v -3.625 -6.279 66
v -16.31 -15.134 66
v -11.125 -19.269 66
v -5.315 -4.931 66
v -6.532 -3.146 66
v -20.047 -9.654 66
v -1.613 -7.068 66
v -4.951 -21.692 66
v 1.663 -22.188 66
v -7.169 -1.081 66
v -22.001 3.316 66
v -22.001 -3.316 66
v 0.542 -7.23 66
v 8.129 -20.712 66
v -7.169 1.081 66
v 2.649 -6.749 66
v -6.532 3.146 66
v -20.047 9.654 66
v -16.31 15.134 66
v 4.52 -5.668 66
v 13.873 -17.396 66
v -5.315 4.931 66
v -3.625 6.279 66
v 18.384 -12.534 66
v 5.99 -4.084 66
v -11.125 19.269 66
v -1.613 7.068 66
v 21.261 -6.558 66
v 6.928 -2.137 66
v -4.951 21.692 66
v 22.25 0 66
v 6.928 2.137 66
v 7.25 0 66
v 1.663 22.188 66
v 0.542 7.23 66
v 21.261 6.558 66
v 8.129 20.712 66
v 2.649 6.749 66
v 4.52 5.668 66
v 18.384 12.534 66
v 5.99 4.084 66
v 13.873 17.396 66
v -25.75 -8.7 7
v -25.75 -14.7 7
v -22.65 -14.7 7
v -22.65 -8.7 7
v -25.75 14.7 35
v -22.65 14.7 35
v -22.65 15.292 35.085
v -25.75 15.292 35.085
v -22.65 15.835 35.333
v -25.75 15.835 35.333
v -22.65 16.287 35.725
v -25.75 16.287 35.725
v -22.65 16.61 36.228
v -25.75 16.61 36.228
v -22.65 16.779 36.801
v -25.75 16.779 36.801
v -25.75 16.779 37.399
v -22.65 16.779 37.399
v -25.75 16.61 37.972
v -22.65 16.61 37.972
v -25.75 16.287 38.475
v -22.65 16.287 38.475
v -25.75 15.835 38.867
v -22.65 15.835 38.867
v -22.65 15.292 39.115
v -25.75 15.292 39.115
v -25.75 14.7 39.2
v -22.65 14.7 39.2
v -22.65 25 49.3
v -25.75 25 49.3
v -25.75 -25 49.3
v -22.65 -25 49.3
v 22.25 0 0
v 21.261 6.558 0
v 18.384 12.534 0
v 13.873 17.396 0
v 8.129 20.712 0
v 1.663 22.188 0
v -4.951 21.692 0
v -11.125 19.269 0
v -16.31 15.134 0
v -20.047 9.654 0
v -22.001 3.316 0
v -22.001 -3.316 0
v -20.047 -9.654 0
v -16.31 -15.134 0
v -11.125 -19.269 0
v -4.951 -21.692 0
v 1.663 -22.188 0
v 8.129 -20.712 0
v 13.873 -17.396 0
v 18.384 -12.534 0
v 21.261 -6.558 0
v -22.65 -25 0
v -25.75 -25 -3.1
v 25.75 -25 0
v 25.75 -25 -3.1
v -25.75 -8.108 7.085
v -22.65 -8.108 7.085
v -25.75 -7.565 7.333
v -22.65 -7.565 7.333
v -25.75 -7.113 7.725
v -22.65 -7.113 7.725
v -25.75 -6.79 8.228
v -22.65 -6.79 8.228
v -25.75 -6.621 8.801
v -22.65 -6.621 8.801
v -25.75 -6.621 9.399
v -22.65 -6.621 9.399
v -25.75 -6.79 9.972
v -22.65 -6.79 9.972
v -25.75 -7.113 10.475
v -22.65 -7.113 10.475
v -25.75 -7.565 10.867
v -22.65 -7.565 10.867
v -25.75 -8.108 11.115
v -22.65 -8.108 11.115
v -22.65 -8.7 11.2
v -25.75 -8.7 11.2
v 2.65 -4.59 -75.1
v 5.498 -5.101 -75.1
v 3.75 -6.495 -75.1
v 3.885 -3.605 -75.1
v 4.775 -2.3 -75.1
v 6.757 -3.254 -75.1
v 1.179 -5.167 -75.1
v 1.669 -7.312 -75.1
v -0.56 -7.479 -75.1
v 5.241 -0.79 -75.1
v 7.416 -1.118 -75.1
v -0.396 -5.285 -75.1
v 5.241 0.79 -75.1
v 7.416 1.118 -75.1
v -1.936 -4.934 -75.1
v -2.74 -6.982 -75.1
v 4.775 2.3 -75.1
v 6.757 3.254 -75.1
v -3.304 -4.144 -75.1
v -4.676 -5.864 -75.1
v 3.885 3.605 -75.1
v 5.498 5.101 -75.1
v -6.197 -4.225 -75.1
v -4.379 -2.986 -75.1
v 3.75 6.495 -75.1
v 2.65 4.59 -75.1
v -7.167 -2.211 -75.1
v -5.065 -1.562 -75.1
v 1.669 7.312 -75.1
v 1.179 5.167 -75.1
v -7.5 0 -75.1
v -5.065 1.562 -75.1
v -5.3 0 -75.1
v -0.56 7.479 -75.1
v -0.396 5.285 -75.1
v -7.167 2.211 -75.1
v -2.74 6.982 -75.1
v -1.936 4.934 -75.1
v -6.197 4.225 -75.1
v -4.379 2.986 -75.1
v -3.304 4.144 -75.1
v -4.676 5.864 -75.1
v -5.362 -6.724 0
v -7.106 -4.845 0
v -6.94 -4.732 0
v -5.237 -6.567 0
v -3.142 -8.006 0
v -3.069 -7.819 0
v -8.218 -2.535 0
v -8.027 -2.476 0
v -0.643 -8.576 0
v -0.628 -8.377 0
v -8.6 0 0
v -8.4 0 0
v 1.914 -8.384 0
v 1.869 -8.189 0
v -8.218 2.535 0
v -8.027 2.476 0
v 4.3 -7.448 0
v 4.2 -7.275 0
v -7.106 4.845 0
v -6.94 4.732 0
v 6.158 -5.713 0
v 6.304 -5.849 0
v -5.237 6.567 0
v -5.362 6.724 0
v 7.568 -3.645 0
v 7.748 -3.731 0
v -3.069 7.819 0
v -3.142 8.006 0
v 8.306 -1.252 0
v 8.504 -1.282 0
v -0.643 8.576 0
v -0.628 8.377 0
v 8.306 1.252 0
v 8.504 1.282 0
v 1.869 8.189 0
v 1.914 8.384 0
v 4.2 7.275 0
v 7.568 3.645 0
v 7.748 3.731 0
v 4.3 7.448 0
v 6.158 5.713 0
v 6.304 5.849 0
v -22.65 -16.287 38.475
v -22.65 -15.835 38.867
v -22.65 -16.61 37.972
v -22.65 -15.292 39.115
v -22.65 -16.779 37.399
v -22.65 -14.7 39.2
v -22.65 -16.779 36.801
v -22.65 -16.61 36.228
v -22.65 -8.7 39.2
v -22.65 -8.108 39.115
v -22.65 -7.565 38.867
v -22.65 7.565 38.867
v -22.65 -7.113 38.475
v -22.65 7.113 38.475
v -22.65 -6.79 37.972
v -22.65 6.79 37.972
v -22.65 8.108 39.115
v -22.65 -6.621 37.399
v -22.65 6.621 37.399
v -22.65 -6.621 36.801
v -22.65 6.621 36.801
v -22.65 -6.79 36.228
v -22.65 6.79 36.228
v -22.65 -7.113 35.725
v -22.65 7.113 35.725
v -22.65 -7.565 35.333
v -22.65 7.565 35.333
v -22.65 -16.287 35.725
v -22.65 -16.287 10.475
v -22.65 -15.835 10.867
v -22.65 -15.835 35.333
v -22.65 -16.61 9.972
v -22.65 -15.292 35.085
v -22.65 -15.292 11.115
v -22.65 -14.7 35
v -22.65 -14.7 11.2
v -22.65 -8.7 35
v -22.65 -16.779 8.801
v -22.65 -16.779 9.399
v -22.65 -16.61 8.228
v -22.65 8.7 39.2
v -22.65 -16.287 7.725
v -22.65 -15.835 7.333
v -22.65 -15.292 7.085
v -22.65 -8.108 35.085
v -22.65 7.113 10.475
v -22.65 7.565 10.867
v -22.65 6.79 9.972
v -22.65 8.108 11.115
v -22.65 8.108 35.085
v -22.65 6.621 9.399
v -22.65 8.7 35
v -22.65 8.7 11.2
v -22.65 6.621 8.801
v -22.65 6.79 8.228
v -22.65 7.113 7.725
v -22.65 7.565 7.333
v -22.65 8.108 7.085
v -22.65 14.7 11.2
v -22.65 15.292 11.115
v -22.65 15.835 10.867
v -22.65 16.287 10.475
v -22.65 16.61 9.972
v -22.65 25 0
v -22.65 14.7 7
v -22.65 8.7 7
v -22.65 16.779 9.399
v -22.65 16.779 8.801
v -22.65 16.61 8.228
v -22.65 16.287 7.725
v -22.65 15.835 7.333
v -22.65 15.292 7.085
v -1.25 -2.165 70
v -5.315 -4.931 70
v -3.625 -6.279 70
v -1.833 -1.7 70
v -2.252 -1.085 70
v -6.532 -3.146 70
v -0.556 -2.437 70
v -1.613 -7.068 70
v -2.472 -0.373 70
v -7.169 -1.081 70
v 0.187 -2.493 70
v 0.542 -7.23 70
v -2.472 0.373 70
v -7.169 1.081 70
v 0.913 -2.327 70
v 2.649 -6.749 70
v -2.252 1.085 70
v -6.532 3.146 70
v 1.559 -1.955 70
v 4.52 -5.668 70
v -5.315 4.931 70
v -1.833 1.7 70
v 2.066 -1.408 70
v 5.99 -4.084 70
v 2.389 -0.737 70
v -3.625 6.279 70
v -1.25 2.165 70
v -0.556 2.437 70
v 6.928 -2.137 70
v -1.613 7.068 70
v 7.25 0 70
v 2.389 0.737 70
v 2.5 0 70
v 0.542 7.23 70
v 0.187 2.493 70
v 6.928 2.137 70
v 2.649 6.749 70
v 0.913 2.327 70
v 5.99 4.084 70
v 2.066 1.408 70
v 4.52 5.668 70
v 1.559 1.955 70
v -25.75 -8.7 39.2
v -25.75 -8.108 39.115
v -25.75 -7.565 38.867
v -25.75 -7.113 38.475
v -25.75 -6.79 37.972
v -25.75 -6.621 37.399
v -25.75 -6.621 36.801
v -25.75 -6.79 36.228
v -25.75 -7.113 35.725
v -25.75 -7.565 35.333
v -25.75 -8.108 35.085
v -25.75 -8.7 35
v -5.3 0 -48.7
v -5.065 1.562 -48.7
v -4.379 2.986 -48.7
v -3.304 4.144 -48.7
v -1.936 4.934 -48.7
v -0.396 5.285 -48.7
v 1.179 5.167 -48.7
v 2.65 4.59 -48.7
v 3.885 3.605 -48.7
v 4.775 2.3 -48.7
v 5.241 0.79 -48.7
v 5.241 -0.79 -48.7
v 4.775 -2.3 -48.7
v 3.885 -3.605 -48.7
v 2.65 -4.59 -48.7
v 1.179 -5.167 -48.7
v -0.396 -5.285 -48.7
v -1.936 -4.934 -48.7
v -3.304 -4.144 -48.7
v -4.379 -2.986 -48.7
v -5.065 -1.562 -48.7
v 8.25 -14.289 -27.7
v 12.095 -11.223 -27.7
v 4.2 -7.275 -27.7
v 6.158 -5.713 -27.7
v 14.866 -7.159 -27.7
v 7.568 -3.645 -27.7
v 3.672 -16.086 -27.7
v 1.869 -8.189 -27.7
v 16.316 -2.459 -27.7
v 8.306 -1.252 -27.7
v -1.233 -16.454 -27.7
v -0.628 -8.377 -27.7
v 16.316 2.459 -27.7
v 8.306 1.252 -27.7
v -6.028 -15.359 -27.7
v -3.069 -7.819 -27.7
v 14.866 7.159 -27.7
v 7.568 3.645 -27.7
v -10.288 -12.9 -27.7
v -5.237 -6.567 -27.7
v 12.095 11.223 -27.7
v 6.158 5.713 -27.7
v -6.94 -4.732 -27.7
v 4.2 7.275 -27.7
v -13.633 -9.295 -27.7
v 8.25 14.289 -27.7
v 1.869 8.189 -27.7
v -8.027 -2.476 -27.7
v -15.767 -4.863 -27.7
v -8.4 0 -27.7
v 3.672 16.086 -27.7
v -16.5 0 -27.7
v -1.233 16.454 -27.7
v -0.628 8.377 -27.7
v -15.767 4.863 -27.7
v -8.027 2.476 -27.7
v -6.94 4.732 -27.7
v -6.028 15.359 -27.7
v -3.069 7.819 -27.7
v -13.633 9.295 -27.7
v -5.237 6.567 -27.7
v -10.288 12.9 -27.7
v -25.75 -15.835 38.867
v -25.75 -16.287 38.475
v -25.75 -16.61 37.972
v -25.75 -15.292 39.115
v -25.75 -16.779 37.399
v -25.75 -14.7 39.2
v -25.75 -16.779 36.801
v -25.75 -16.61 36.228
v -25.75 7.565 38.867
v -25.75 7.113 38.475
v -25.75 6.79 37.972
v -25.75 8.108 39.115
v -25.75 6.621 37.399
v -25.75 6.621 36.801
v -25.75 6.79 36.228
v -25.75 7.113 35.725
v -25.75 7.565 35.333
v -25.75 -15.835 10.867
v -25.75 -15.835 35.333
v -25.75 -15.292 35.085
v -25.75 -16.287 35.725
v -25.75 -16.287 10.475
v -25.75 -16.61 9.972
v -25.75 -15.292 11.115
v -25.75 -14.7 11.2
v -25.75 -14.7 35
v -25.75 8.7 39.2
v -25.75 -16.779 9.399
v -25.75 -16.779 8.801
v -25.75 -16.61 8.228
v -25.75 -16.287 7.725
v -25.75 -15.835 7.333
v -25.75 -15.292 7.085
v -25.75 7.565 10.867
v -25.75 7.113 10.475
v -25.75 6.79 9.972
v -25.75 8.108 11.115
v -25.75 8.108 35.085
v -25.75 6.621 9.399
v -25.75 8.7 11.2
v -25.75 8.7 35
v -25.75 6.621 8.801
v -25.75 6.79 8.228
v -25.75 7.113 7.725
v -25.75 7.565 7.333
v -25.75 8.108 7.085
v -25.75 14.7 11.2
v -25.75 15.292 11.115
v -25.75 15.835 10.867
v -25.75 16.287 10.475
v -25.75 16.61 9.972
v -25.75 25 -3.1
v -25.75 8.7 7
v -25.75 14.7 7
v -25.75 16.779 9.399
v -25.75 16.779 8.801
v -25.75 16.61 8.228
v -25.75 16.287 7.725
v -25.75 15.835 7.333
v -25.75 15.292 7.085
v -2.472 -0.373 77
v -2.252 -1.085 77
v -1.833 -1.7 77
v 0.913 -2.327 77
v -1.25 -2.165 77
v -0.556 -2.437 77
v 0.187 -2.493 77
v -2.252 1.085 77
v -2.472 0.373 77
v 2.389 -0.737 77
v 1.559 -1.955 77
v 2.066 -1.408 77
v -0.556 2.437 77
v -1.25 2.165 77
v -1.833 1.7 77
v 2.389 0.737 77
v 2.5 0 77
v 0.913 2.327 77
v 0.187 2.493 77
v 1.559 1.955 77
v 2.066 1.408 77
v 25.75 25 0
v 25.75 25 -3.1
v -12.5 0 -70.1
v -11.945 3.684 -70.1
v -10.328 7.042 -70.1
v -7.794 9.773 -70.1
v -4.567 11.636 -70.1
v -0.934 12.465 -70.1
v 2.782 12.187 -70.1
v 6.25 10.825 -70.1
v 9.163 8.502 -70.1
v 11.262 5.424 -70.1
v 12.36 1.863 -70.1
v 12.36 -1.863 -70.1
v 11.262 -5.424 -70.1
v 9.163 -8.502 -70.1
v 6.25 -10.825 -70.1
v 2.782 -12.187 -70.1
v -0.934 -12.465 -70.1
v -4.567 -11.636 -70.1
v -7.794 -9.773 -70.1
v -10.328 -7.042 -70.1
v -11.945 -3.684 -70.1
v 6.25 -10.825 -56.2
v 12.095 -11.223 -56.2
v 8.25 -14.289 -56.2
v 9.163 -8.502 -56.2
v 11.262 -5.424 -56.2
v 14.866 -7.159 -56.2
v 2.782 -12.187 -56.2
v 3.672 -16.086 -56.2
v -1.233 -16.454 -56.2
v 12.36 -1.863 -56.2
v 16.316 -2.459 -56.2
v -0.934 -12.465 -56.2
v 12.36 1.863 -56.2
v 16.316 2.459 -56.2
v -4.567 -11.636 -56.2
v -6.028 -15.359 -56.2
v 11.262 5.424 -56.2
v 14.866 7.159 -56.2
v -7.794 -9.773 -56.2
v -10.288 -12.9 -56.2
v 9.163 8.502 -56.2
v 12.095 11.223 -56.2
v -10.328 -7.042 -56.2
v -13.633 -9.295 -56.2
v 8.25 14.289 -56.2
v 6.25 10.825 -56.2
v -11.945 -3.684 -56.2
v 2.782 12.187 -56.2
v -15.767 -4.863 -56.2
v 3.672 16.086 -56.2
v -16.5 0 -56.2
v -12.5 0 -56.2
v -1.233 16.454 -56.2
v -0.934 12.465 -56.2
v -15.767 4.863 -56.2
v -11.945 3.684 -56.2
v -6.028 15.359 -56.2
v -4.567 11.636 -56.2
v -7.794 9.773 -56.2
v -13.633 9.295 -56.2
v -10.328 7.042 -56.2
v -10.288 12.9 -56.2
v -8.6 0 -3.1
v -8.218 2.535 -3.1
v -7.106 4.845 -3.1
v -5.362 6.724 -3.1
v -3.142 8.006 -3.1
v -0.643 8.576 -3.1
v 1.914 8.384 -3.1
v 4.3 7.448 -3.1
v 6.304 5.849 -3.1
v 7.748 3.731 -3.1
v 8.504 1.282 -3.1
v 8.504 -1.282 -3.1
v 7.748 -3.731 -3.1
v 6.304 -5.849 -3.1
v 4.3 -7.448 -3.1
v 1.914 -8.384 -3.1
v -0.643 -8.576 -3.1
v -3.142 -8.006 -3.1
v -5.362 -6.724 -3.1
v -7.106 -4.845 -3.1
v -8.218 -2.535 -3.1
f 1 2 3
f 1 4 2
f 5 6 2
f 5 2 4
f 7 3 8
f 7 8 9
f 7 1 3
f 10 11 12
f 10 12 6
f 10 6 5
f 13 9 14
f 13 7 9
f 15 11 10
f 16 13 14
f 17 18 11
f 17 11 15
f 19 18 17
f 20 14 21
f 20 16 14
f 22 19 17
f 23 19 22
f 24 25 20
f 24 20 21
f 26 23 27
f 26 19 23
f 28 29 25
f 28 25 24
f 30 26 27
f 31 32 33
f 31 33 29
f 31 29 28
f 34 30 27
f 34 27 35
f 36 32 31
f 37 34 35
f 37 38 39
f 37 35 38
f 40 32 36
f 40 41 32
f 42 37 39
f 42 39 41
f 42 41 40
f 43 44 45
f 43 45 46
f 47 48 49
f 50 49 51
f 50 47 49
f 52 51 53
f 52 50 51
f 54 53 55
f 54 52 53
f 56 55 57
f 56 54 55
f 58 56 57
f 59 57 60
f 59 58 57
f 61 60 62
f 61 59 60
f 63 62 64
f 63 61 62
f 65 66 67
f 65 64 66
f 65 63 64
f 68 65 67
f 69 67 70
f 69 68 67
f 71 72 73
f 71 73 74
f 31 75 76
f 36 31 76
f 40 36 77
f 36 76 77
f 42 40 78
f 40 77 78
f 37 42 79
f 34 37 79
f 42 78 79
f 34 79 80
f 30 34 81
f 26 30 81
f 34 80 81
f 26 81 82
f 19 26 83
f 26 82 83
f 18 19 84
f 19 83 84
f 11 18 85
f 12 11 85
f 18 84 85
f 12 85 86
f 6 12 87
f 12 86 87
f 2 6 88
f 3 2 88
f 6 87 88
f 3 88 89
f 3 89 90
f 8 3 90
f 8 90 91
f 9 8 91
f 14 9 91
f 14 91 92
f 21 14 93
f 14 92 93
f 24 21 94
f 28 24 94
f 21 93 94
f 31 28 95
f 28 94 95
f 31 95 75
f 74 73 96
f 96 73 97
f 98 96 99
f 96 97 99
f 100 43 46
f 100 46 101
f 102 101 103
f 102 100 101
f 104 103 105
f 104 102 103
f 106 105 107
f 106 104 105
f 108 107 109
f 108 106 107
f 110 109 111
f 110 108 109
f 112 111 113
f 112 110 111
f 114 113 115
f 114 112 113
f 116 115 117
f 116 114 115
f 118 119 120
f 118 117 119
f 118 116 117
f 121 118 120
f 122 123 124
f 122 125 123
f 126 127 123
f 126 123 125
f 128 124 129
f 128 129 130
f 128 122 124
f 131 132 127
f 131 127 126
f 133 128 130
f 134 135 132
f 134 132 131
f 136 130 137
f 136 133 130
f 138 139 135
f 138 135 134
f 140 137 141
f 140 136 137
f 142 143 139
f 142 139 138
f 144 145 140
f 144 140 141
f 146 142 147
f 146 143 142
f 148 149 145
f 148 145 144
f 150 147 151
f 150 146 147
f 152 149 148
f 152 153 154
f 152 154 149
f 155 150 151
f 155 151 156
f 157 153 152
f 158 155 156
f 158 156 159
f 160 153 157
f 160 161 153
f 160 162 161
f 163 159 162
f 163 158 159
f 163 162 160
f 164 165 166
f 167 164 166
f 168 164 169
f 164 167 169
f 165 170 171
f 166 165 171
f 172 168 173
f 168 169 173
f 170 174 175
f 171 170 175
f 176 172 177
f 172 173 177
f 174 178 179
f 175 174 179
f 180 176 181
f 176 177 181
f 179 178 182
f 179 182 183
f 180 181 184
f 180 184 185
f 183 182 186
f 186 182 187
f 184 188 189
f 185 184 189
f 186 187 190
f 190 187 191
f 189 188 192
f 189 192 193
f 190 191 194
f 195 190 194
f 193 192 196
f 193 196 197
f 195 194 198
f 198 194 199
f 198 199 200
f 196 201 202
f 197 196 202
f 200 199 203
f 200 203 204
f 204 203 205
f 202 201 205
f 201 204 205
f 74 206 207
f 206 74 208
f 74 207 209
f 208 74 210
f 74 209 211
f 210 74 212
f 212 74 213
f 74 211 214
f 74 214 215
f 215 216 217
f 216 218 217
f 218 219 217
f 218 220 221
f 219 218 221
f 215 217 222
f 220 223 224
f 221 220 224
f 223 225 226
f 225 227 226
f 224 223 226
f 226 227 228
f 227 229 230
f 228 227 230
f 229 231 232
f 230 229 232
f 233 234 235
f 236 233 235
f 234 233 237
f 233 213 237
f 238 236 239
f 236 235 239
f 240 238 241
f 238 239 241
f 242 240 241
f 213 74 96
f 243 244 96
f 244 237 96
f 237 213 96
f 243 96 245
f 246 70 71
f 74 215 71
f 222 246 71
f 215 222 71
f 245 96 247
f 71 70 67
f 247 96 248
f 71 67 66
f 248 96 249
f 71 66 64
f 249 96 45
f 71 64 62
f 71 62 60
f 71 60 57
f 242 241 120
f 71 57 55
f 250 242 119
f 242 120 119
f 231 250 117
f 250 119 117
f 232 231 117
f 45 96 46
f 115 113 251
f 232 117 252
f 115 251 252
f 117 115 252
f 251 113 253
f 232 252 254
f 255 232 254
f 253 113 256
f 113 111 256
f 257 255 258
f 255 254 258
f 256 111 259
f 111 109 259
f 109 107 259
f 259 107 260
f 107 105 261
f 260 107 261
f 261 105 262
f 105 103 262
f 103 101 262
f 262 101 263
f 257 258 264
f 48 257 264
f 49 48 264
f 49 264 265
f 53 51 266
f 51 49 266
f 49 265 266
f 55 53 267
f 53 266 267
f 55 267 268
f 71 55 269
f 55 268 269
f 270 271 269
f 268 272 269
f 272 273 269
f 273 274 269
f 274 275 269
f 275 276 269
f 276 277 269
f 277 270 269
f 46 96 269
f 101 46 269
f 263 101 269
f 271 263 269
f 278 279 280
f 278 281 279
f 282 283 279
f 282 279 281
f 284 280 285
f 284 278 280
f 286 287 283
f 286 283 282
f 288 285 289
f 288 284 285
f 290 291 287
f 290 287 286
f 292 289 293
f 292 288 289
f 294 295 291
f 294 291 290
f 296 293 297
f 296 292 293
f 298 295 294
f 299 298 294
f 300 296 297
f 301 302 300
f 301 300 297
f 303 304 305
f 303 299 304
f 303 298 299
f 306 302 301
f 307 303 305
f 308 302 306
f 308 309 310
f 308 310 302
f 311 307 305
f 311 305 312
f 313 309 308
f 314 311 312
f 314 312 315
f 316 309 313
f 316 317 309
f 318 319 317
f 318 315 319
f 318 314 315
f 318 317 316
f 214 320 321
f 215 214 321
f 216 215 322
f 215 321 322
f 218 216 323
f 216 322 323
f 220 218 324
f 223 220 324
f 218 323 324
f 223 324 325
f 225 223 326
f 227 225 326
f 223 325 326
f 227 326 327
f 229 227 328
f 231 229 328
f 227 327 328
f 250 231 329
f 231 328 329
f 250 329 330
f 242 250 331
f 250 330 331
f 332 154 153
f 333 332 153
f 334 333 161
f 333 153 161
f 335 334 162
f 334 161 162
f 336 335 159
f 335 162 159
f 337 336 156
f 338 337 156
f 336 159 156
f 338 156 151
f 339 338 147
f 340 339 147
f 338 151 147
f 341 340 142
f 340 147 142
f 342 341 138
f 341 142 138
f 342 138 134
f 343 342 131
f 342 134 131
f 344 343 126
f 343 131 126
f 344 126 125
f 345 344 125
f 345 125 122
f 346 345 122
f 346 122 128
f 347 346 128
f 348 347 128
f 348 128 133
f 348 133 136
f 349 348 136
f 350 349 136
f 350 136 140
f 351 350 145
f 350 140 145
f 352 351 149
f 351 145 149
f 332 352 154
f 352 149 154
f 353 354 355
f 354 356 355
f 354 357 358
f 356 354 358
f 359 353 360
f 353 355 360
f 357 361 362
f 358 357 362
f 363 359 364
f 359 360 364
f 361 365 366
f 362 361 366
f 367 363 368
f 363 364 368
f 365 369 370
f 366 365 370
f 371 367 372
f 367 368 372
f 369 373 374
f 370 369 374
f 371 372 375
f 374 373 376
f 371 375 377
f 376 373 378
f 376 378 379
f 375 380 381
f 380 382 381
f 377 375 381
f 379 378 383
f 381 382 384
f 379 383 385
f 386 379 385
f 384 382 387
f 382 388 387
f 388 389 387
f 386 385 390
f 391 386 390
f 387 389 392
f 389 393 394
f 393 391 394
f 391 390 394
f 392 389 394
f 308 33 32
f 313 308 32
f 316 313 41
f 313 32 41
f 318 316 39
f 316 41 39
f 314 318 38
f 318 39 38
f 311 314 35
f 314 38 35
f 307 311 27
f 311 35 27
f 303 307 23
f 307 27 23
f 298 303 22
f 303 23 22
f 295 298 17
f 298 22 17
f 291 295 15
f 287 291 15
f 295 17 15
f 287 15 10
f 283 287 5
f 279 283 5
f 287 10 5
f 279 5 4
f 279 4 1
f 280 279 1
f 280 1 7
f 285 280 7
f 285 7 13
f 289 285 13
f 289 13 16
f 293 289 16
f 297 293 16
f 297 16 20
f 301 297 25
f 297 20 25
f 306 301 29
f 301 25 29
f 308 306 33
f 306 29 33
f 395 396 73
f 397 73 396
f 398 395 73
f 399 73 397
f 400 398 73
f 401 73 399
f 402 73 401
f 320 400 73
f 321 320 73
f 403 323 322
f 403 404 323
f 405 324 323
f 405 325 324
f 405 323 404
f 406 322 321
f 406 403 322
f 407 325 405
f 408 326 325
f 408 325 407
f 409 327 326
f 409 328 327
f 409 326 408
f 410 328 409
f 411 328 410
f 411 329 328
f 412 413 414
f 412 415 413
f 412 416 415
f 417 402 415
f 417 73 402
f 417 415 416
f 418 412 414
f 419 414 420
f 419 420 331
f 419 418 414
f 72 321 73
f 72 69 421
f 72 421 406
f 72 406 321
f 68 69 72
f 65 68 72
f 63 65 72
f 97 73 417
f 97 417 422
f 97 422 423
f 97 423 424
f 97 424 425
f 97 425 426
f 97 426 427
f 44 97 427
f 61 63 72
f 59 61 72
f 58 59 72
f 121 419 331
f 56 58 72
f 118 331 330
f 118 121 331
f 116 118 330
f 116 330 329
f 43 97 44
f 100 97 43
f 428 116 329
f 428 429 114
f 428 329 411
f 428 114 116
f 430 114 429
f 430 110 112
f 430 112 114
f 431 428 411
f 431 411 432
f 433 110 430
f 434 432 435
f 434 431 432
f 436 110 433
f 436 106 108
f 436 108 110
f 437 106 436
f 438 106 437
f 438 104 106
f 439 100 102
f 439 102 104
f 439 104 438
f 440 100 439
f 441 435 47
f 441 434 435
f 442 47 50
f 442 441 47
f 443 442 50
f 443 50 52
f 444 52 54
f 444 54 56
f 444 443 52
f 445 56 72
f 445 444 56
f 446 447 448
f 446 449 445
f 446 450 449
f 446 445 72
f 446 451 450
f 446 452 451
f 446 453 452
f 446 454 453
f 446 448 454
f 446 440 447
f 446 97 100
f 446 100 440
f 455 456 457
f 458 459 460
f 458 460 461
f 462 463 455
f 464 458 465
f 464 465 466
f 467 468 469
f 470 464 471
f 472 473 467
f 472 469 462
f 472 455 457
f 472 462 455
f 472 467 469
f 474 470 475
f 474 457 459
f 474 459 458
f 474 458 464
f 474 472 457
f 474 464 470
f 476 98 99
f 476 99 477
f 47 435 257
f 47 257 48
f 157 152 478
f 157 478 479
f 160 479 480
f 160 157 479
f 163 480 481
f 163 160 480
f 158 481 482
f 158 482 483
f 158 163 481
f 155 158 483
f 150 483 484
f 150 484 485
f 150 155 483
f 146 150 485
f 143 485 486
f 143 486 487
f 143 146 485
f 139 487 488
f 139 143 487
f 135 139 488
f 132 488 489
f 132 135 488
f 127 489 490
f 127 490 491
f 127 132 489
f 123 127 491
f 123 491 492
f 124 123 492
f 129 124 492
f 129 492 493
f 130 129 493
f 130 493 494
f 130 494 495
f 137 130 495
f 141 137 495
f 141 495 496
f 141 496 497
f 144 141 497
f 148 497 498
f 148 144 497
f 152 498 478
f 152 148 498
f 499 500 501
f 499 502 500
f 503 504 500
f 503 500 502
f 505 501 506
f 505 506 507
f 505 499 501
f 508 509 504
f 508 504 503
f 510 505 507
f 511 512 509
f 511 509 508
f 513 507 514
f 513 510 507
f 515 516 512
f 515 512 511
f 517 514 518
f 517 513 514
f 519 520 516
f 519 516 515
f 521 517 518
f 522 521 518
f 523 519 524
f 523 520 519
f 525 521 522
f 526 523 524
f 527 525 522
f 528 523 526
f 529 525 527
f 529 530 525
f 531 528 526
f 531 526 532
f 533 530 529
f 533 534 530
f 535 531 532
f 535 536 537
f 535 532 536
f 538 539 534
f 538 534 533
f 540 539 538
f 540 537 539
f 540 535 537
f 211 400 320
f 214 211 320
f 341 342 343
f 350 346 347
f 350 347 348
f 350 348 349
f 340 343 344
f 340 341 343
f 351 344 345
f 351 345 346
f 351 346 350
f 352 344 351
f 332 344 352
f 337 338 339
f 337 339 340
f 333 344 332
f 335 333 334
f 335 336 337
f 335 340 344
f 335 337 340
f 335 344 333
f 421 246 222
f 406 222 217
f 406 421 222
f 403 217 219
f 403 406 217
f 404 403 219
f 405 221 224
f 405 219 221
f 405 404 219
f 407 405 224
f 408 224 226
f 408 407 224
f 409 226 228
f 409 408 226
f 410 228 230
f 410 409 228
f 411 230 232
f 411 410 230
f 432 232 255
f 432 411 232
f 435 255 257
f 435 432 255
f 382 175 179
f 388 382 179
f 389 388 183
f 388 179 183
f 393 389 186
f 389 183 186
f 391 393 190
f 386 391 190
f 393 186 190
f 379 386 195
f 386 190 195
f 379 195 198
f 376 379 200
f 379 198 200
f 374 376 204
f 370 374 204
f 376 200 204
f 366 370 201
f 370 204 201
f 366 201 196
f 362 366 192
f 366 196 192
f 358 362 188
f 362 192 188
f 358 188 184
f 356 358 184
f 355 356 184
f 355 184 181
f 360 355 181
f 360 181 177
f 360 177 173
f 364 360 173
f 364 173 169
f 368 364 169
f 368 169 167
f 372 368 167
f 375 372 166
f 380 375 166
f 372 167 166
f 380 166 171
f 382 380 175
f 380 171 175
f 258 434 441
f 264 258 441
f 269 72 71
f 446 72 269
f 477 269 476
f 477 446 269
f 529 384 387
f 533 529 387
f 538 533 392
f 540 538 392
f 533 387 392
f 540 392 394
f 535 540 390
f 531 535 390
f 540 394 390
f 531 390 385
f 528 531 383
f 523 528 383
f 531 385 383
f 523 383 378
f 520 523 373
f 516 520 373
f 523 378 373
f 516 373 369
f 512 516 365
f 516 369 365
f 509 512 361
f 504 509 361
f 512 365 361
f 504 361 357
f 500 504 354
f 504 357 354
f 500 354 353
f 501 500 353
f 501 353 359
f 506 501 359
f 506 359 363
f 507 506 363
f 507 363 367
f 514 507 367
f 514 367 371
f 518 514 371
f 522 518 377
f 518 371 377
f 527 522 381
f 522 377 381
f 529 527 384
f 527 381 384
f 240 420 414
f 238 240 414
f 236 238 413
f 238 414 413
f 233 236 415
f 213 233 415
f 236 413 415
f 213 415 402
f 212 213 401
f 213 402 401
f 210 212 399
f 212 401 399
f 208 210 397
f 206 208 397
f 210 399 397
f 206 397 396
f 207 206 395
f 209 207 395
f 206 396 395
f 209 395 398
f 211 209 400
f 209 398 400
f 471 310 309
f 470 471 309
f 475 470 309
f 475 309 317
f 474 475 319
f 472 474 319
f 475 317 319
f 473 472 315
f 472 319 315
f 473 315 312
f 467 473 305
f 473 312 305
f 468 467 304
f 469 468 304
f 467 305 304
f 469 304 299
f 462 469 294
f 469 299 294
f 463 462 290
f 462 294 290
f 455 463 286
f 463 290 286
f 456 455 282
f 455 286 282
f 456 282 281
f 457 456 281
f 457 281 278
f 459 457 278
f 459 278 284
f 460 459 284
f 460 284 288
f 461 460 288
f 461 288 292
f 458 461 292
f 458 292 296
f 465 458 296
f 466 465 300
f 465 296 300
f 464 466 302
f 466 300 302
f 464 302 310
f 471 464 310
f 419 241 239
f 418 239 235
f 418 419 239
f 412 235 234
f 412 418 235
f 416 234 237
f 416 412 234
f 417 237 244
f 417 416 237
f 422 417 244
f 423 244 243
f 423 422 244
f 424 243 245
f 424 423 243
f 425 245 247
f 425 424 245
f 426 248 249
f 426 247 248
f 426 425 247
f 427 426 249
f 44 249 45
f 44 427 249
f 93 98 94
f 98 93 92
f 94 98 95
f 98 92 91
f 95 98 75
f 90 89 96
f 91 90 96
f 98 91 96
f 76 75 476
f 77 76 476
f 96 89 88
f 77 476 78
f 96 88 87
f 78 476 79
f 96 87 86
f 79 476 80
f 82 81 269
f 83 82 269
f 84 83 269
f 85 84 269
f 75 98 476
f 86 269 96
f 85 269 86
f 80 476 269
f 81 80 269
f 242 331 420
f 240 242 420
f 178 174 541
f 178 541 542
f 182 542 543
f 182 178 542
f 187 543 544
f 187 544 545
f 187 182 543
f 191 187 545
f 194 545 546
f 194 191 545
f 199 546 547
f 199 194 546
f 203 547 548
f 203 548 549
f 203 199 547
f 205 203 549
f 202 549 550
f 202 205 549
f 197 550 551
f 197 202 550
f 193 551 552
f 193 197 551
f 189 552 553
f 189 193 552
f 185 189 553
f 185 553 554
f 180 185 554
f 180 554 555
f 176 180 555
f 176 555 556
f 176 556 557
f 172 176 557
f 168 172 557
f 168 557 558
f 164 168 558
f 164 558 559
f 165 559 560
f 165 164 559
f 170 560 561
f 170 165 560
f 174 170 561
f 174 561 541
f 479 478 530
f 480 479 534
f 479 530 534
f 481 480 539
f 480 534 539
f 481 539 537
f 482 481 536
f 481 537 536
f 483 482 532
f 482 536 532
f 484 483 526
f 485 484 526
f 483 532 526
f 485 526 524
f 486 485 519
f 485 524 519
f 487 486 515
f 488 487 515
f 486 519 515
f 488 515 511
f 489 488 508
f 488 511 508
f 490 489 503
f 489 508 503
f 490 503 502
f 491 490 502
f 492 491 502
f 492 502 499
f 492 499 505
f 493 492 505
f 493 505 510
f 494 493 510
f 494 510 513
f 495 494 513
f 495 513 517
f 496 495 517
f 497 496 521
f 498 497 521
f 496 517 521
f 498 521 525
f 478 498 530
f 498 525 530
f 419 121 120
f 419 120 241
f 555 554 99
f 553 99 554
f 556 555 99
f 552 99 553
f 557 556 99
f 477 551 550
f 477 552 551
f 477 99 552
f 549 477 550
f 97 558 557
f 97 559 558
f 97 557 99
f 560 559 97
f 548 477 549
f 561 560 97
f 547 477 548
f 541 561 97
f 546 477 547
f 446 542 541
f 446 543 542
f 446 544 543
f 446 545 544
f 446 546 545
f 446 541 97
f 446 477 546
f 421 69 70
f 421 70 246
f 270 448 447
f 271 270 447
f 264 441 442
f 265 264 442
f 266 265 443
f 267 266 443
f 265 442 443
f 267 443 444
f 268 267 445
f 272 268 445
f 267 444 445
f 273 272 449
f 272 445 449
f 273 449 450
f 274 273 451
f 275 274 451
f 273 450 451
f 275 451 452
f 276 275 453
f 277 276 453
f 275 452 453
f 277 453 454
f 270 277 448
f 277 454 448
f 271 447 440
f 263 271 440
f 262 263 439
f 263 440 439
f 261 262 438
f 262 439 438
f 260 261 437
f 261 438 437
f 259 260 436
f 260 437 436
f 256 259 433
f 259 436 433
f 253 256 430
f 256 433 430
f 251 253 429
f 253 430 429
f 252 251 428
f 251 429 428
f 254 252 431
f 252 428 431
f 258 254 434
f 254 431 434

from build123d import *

# Parameters (mm, degrees)
SKETCH1_R           = 22.25
BOSS_EXTRUDE1_DEPTH = 66
SKETCH2_R           = 7.25
BOSS_EXTRUDE2_DEPTH = 4
SKETCH3_R           = 2.5
BOSS_EXTRUDE3_DEPTH = 7
SKETCH4_W           = 51.5
SKETCH4_H           = 50
SKETCH4_R           = 8.6
BOSS_EXTRUDE4_DEPTH = 3.1
SKETCH5_R           = 8.4
BOSS_EXTRUDE5_DEPTH = 27.7
SKETCH6_R           = 16.5
BOSS_EXTRUDE6_DEPTH = 28.5
SKETCH7_R           = 12.5
BOSS_EXTRUDE7_DEPTH = 18.9
SKETCH8_R           = 5.3
CUT_EXTRUDE1_DEPTH  = 26.4
CHAMFER1_SIZE       = 5
SKETCH9_W           = 3.1
SKETCH9_H           = 50
BOSS_EXTRUDE8_DEPTH = 49.3
CUT_EXTRUDE2_REACH  = 53.5


with BuildPart() as part:
    # Sketch1 → Boss-Extrude1 (new body)
    with BuildSketch(Plane.XY):
        Circle(SKETCH1_R)
    extrude(amount=BOSS_EXTRUDE1_DEPTH)

    # Sketch2 → Boss-Extrude2 (add)
    with BuildSketch(Plane.XY.offset(66)):
        Circle(SKETCH2_R)
    extrude(amount=BOSS_EXTRUDE2_DEPTH)

    # Sketch3 → Boss-Extrude3 (add)
    with BuildSketch(Plane.XY.offset(70)):
        Circle(SKETCH3_R)
    extrude(amount=BOSS_EXTRUDE3_DEPTH)

    # Sketch4 → Boss-Extrude4 (add)
    with BuildSketch(Plane(origin=(0, 0, 0), x_dir=(-1, 0, 0), z_dir=(0, 0, -1))):
        Rectangle(SKETCH4_W, SKETCH4_H)
        Circle(SKETCH4_R, mode=Mode.SUBTRACT)
    extrude(amount=BOSS_EXTRUDE4_DEPTH)

    # Sketch5 → Boss-Extrude5 (add)
    with BuildSketch(Plane(origin=(0, 0, 0), x_dir=(-1, 0, 0), z_dir=(0, 0, -1))):
        Circle(SKETCH5_R)
    extrude(amount=BOSS_EXTRUDE5_DEPTH)

    # Sketch6 → Boss-Extrude6 (add)
    with BuildSketch(Plane(origin=(0, 0, -27.7), x_dir=(-1, 0, 0), z_dir=(0, 0, -1))):
        Circle(SKETCH6_R)
    extrude(amount=BOSS_EXTRUDE6_DEPTH)

    # Sketch7 → Boss-Extrude7 (add)
    with BuildSketch(Plane(origin=(0, 0, -56.2), x_dir=(-1, 0, 0), z_dir=(0, 0, -1))):
        Circle(SKETCH7_R)
    extrude(amount=BOSS_EXTRUDE7_DEPTH)

    # Sketch8 → Cut-Extrude1 (cut)
    with BuildSketch(Plane(origin=(0, 0, -75.1), x_dir=(-1, 0, 0), z_dir=(0, 0, -1))):
        Circle(SKETCH8_R)
    extrude(amount=-CUT_EXTRUDE1_DEPTH, mode=Mode.SUBTRACT)

    # Chamfer1
    chamfer1_edges = [part.edges().sort_by_distance(p)[0] for p in [
        (12.5, 0, -75.1),
    ]]
    chamfer(chamfer1_edges, length=CHAMFER1_SIZE)

    # Sketch9 → Boss-Extrude8 (add)
    with BuildSketch(Plane.XY):
        with Locations((-24.2, 0)):
            Rectangle(SKETCH9_W, SKETCH9_H)
    extrude(amount=BOSS_EXTRUDE8_DEPTH)

    # Sketch10 → Cut-Extrude2 (cut, up to next)
    with BuildSketch(Plane.ZY.offset(25.75), mode=Mode.PRIVATE) as cut_extrude2_sk1:
        with BuildLine():
            Line((39.2, 14.7), (39.2, 8.7))
            ThreePointArc((39.2, 8.7), (37.1, 6.6), (35, 8.7))
            Line((35, 8.7), (35, 14.7))
            ThreePointArc((35, 14.7), (37.1, 16.8), (39.2, 14.7))
        make_face()
    cut_extrude2_tool1 = extrude(cut_extrude2_sk1.sketch, amount=-CUT_EXTRUDE2_REACH, mode=Mode.PRIVATE) & part.part
    add(cut_extrude2_tool1.solids().sort_by_distance((-25.75, 11.7, 37.1))[0], mode=Mode.SUBTRACT)
    # Sketch10 → Cut-Extrude2 (cut, up to next)
    with BuildSketch(Plane.ZY.offset(25.75), mode=Mode.PRIVATE) as cut_extrude2_sk2:
        with BuildLine():
            Line((39.2, -14.7), (39.2, -8.7))
            ThreePointArc((39.2, -8.7), (37.1, -6.6), (35, -8.7))
            Line((35, -8.7), (35, -14.7))
            ThreePointArc((35, -14.7), (37.1, -16.8), (39.2, -14.7))
        make_face()
    cut_extrude2_tool2 = extrude(cut_extrude2_sk2.sketch, amount=-CUT_EXTRUDE2_REACH, mode=Mode.PRIVATE) & part.part
    add(cut_extrude2_tool2.solids().sort_by_distance((-25.75, -11.7, 37.1))[0], mode=Mode.SUBTRACT)
    # Sketch10 → Cut-Extrude2 (cut, up to next)
    with BuildSketch(Plane.ZY.offset(25.75), mode=Mode.PRIVATE) as cut_extrude2_sk3:
        with BuildLine():
            Line((7, -14.7), (7, -8.7))
            ThreePointArc((7, -8.7), (9.1, -6.6), (11.2, -8.7))
            Line((11.2, -8.7), (11.2, -14.7))
            ThreePointArc((11.2, -14.7), (9.1, -16.8), (7, -14.7))
        make_face()
    cut_extrude2_tool3 = extrude(cut_extrude2_sk3.sketch, amount=-CUT_EXTRUDE2_REACH, mode=Mode.PRIVATE) & part.part
    add(cut_extrude2_tool3.solids().sort_by_distance((-25.75, -11.7, 9.1))[0], mode=Mode.SUBTRACT)
    # Sketch10 → Cut-Extrude2 (cut, up to next)
    with BuildSketch(Plane.ZY.offset(25.75), mode=Mode.PRIVATE) as cut_extrude2_sk4:
        with BuildLine():
            Line((7, 14.7), (7, 8.7))
            ThreePointArc((7, 8.7), (9.1, 6.6), (11.2, 8.7))
            Line((11.2, 8.7), (11.2, 14.7))
            ThreePointArc((11.2, 14.7), (9.1, 16.8), (7, 14.7))
        make_face()
    cut_extrude2_tool4 = extrude(cut_extrude2_sk4.sketch, amount=-CUT_EXTRUDE2_REACH, mode=Mode.PRIVATE) & part.part
    add(cut_extrude2_tool4.solids().sort_by_distance((-25.75, 11.7, 9.1))[0], mode=Mode.SUBTRACT)


solid = part.part
